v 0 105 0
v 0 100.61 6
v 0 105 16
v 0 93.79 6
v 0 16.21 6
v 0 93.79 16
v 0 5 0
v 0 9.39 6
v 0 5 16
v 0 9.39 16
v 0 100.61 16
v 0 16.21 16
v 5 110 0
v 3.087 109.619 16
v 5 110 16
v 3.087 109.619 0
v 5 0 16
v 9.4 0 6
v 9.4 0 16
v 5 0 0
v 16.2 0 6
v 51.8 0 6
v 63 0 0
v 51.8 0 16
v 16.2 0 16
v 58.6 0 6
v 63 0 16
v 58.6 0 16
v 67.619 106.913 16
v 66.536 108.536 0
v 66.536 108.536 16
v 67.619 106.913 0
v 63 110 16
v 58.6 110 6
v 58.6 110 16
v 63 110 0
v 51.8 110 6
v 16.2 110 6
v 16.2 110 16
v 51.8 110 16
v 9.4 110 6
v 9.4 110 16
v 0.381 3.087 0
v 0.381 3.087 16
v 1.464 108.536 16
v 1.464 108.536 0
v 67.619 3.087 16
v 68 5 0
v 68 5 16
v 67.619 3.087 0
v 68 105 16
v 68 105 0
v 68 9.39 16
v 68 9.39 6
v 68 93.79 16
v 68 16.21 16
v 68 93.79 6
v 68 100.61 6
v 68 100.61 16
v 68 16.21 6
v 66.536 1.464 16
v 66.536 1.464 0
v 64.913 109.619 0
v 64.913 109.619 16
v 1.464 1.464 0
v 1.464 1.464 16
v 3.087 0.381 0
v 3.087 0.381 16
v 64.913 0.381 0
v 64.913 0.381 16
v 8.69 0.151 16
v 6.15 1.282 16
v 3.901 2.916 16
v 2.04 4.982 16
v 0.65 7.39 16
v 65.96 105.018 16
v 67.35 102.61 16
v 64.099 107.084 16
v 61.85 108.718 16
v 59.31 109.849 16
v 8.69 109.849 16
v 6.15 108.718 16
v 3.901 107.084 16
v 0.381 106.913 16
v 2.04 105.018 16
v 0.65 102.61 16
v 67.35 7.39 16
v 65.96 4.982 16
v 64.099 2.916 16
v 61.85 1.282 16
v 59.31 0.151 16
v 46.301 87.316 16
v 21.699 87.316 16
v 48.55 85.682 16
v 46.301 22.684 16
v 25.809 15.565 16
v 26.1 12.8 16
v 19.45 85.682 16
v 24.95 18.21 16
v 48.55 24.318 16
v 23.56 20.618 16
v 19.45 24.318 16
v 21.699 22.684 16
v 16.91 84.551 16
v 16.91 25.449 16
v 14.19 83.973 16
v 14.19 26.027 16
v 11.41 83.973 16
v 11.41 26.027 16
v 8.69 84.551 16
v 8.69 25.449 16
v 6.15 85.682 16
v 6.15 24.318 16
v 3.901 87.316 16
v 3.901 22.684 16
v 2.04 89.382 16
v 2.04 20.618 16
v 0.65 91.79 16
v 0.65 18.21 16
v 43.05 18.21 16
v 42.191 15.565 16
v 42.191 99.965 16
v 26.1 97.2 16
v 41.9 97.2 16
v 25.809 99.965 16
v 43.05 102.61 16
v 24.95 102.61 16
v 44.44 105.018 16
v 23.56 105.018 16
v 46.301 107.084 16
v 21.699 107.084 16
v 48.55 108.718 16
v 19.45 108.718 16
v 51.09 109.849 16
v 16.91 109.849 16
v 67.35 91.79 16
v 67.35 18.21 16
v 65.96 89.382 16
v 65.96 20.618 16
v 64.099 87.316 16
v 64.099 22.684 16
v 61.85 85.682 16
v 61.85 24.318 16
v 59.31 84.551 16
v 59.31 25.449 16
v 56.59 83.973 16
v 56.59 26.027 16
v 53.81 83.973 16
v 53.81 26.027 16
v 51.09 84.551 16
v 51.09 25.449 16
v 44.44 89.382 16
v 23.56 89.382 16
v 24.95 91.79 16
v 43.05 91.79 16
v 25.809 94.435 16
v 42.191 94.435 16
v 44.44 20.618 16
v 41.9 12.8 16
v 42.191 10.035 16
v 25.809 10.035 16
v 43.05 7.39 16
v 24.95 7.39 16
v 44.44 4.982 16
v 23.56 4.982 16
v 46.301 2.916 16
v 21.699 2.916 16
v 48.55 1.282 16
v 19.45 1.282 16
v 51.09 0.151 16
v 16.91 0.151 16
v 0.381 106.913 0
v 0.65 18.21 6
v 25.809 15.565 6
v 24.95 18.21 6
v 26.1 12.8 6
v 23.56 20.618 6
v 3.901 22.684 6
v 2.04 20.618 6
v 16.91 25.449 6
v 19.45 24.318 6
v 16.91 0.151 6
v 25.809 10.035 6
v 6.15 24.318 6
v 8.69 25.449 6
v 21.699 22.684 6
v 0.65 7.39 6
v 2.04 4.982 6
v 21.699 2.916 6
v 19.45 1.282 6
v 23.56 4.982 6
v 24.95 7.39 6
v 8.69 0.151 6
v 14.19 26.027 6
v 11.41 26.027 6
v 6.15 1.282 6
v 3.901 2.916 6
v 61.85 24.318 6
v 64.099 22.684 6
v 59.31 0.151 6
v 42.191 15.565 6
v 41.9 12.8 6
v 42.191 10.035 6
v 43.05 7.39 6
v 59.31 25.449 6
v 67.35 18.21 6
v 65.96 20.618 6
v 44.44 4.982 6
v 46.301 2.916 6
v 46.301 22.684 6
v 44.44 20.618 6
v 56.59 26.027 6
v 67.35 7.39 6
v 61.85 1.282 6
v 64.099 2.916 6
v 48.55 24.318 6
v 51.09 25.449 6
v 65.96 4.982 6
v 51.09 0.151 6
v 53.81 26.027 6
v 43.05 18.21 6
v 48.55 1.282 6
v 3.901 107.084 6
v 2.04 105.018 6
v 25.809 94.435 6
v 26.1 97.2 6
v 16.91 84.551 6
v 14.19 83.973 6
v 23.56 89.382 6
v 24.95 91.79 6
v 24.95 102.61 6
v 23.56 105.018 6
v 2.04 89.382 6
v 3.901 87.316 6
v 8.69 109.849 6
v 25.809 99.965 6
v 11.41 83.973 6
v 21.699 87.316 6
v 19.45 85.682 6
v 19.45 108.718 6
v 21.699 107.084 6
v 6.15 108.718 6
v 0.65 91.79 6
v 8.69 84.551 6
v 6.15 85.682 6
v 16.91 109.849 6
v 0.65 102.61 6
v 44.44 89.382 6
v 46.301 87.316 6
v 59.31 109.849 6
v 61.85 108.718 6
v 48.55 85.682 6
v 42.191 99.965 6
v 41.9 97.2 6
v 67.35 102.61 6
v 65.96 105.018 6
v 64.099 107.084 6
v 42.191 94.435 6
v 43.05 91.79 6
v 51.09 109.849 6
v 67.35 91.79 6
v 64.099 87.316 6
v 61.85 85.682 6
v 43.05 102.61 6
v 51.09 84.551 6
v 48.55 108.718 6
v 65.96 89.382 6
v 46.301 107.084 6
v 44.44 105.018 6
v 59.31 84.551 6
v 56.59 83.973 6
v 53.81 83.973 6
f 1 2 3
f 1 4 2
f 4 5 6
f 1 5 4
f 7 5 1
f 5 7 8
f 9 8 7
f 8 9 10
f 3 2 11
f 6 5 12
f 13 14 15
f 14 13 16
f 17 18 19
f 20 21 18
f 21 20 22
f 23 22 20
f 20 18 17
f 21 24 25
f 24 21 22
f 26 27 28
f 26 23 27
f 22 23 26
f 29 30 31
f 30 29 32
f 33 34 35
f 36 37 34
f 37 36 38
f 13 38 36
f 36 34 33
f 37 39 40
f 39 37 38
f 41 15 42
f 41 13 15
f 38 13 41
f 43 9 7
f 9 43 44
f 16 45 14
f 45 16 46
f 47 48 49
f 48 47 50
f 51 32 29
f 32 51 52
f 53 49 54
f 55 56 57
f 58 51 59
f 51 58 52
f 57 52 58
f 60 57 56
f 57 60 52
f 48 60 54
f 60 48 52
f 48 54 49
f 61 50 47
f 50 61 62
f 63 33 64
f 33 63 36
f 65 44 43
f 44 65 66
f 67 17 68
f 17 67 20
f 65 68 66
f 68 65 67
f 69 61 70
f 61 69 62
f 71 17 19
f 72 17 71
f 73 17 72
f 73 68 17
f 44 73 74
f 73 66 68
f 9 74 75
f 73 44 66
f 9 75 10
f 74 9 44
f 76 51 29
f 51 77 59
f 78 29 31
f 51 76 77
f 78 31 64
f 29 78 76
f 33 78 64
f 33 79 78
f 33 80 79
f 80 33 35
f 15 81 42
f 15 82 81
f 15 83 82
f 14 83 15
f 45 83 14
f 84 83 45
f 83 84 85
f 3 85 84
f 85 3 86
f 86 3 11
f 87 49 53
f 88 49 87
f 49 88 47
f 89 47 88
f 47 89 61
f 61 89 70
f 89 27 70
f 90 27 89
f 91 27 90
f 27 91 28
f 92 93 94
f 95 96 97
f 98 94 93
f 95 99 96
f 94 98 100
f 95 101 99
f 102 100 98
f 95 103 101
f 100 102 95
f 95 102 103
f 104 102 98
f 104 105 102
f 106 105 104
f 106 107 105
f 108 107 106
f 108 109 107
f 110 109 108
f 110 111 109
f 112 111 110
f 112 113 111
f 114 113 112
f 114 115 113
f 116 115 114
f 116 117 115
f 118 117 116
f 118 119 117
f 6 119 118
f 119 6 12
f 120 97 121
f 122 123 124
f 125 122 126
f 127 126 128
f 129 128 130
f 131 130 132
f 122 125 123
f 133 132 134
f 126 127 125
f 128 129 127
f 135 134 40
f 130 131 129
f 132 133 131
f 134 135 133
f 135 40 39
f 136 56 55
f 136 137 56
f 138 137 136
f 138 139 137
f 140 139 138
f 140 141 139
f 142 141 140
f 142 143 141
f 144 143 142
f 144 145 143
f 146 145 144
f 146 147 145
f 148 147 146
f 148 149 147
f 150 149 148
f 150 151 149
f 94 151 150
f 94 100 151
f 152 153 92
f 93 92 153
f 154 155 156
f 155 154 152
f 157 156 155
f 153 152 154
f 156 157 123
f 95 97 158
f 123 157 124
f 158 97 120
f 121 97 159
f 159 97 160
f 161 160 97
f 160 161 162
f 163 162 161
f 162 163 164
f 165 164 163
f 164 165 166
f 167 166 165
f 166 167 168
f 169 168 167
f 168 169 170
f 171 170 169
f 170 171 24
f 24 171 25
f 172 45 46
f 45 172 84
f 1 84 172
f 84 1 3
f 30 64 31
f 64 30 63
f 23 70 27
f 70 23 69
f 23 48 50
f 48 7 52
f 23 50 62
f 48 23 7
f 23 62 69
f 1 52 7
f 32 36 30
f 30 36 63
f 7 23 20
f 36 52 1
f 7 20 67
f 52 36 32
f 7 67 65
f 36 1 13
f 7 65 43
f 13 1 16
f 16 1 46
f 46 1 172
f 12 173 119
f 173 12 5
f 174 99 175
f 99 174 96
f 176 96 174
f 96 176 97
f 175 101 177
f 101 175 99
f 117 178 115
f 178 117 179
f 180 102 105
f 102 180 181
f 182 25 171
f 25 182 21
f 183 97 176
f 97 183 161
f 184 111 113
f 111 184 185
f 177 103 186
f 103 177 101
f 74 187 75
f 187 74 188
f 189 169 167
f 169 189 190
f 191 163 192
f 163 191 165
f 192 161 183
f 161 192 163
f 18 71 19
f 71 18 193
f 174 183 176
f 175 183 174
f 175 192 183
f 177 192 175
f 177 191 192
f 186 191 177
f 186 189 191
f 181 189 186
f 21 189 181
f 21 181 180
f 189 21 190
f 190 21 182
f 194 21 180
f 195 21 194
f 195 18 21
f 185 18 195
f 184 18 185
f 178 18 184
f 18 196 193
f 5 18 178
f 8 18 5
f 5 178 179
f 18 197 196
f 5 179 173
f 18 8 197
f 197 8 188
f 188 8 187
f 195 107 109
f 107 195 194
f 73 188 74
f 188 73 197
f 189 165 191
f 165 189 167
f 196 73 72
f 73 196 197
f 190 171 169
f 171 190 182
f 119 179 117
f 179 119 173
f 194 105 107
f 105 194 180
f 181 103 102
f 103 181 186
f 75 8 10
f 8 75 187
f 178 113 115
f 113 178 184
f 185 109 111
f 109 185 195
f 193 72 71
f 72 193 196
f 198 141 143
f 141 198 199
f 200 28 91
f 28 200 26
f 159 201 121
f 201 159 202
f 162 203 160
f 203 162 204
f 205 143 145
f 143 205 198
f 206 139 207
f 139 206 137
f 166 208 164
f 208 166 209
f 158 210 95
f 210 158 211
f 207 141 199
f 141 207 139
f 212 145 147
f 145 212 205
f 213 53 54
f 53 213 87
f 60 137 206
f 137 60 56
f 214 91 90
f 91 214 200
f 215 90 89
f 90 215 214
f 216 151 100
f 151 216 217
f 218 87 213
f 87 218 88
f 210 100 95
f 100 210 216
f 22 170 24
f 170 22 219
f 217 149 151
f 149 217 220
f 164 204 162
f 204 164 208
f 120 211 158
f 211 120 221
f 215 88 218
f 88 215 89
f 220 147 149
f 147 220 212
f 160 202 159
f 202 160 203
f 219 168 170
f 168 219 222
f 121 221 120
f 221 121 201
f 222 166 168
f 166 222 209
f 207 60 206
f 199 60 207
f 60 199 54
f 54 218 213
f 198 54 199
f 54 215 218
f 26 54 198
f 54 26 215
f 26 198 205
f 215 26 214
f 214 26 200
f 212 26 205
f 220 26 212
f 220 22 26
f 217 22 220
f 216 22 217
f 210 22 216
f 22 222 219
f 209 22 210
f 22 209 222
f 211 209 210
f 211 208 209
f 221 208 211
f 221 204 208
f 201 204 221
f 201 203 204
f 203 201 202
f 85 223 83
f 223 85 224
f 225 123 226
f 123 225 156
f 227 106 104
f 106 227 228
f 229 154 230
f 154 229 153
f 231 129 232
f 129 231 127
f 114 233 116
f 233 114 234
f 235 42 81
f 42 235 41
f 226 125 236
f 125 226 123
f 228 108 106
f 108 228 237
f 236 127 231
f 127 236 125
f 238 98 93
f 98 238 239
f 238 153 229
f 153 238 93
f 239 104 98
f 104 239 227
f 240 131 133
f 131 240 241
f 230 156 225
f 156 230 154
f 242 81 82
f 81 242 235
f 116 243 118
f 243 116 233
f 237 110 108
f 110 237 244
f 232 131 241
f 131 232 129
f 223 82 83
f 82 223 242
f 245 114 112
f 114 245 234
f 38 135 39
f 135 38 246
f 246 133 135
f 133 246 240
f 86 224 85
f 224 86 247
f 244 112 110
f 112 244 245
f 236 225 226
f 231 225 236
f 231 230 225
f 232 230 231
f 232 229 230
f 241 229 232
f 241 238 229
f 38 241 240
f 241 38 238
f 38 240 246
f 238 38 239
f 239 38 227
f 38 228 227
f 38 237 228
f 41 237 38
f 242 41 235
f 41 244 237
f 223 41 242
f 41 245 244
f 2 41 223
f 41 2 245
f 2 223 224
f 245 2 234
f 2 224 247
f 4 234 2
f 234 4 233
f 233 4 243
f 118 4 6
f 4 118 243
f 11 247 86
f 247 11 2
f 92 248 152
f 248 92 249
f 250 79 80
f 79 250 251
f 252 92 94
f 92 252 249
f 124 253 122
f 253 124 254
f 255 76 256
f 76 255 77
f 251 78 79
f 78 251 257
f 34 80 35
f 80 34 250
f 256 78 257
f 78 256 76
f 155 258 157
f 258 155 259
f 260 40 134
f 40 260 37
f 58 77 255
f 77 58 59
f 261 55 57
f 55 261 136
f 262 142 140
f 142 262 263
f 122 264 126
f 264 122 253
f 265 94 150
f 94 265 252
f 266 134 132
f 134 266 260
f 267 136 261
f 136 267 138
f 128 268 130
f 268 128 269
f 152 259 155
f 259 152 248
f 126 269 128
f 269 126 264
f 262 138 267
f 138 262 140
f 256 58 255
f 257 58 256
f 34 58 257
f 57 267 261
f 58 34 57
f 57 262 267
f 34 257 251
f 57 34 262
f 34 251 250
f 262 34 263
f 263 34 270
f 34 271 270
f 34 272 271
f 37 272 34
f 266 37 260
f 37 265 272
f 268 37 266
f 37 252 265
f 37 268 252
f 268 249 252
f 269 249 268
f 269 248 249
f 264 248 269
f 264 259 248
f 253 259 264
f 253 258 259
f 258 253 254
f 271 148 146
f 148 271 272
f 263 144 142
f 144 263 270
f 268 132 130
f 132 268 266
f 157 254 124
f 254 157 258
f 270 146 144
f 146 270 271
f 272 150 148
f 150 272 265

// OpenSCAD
// Map Masters

module roundedCube(vec,rad) {
    hull() {
        translate([rad,rad,0]) cylinder(r=rad,h=vec.z);
        translate([vec.x-rad,rad,0]) cylinder(r=rad,h=vec.z);
        translate([rad,vec.y-rad,0]) cylinder(r=rad,h=vec.z);
        translate([vec.x-rad,vec.y-rad,0]) cylinder(r=rad,h=vec.z);
    }
}

/* difference() {
    roundedCube([68,110,16],5);
    translate([0.8,0.8,0.8]) roundedCube([68-1.6,30,99],5);
    translate([0.8,31.6,0.8]) roundedCube([68-1.6,110-30-2.4,99],5);
} */

difference() {
    ra = 25.6/2;
    roundedCube([68,110,16],5);
    translate([ra,ra,6]) cylinder(r=ra+0.5,h=10);
    translate([68-ra,ra,6]) cylinder(r=ra+0.5,h=10);
    translate([ra,110-ra,6]) cylinder(r=ra+0.5,h=10);
    translate([68-ra,110-ra,6]) cylinder(r=ra+0.5,h=10);

}
